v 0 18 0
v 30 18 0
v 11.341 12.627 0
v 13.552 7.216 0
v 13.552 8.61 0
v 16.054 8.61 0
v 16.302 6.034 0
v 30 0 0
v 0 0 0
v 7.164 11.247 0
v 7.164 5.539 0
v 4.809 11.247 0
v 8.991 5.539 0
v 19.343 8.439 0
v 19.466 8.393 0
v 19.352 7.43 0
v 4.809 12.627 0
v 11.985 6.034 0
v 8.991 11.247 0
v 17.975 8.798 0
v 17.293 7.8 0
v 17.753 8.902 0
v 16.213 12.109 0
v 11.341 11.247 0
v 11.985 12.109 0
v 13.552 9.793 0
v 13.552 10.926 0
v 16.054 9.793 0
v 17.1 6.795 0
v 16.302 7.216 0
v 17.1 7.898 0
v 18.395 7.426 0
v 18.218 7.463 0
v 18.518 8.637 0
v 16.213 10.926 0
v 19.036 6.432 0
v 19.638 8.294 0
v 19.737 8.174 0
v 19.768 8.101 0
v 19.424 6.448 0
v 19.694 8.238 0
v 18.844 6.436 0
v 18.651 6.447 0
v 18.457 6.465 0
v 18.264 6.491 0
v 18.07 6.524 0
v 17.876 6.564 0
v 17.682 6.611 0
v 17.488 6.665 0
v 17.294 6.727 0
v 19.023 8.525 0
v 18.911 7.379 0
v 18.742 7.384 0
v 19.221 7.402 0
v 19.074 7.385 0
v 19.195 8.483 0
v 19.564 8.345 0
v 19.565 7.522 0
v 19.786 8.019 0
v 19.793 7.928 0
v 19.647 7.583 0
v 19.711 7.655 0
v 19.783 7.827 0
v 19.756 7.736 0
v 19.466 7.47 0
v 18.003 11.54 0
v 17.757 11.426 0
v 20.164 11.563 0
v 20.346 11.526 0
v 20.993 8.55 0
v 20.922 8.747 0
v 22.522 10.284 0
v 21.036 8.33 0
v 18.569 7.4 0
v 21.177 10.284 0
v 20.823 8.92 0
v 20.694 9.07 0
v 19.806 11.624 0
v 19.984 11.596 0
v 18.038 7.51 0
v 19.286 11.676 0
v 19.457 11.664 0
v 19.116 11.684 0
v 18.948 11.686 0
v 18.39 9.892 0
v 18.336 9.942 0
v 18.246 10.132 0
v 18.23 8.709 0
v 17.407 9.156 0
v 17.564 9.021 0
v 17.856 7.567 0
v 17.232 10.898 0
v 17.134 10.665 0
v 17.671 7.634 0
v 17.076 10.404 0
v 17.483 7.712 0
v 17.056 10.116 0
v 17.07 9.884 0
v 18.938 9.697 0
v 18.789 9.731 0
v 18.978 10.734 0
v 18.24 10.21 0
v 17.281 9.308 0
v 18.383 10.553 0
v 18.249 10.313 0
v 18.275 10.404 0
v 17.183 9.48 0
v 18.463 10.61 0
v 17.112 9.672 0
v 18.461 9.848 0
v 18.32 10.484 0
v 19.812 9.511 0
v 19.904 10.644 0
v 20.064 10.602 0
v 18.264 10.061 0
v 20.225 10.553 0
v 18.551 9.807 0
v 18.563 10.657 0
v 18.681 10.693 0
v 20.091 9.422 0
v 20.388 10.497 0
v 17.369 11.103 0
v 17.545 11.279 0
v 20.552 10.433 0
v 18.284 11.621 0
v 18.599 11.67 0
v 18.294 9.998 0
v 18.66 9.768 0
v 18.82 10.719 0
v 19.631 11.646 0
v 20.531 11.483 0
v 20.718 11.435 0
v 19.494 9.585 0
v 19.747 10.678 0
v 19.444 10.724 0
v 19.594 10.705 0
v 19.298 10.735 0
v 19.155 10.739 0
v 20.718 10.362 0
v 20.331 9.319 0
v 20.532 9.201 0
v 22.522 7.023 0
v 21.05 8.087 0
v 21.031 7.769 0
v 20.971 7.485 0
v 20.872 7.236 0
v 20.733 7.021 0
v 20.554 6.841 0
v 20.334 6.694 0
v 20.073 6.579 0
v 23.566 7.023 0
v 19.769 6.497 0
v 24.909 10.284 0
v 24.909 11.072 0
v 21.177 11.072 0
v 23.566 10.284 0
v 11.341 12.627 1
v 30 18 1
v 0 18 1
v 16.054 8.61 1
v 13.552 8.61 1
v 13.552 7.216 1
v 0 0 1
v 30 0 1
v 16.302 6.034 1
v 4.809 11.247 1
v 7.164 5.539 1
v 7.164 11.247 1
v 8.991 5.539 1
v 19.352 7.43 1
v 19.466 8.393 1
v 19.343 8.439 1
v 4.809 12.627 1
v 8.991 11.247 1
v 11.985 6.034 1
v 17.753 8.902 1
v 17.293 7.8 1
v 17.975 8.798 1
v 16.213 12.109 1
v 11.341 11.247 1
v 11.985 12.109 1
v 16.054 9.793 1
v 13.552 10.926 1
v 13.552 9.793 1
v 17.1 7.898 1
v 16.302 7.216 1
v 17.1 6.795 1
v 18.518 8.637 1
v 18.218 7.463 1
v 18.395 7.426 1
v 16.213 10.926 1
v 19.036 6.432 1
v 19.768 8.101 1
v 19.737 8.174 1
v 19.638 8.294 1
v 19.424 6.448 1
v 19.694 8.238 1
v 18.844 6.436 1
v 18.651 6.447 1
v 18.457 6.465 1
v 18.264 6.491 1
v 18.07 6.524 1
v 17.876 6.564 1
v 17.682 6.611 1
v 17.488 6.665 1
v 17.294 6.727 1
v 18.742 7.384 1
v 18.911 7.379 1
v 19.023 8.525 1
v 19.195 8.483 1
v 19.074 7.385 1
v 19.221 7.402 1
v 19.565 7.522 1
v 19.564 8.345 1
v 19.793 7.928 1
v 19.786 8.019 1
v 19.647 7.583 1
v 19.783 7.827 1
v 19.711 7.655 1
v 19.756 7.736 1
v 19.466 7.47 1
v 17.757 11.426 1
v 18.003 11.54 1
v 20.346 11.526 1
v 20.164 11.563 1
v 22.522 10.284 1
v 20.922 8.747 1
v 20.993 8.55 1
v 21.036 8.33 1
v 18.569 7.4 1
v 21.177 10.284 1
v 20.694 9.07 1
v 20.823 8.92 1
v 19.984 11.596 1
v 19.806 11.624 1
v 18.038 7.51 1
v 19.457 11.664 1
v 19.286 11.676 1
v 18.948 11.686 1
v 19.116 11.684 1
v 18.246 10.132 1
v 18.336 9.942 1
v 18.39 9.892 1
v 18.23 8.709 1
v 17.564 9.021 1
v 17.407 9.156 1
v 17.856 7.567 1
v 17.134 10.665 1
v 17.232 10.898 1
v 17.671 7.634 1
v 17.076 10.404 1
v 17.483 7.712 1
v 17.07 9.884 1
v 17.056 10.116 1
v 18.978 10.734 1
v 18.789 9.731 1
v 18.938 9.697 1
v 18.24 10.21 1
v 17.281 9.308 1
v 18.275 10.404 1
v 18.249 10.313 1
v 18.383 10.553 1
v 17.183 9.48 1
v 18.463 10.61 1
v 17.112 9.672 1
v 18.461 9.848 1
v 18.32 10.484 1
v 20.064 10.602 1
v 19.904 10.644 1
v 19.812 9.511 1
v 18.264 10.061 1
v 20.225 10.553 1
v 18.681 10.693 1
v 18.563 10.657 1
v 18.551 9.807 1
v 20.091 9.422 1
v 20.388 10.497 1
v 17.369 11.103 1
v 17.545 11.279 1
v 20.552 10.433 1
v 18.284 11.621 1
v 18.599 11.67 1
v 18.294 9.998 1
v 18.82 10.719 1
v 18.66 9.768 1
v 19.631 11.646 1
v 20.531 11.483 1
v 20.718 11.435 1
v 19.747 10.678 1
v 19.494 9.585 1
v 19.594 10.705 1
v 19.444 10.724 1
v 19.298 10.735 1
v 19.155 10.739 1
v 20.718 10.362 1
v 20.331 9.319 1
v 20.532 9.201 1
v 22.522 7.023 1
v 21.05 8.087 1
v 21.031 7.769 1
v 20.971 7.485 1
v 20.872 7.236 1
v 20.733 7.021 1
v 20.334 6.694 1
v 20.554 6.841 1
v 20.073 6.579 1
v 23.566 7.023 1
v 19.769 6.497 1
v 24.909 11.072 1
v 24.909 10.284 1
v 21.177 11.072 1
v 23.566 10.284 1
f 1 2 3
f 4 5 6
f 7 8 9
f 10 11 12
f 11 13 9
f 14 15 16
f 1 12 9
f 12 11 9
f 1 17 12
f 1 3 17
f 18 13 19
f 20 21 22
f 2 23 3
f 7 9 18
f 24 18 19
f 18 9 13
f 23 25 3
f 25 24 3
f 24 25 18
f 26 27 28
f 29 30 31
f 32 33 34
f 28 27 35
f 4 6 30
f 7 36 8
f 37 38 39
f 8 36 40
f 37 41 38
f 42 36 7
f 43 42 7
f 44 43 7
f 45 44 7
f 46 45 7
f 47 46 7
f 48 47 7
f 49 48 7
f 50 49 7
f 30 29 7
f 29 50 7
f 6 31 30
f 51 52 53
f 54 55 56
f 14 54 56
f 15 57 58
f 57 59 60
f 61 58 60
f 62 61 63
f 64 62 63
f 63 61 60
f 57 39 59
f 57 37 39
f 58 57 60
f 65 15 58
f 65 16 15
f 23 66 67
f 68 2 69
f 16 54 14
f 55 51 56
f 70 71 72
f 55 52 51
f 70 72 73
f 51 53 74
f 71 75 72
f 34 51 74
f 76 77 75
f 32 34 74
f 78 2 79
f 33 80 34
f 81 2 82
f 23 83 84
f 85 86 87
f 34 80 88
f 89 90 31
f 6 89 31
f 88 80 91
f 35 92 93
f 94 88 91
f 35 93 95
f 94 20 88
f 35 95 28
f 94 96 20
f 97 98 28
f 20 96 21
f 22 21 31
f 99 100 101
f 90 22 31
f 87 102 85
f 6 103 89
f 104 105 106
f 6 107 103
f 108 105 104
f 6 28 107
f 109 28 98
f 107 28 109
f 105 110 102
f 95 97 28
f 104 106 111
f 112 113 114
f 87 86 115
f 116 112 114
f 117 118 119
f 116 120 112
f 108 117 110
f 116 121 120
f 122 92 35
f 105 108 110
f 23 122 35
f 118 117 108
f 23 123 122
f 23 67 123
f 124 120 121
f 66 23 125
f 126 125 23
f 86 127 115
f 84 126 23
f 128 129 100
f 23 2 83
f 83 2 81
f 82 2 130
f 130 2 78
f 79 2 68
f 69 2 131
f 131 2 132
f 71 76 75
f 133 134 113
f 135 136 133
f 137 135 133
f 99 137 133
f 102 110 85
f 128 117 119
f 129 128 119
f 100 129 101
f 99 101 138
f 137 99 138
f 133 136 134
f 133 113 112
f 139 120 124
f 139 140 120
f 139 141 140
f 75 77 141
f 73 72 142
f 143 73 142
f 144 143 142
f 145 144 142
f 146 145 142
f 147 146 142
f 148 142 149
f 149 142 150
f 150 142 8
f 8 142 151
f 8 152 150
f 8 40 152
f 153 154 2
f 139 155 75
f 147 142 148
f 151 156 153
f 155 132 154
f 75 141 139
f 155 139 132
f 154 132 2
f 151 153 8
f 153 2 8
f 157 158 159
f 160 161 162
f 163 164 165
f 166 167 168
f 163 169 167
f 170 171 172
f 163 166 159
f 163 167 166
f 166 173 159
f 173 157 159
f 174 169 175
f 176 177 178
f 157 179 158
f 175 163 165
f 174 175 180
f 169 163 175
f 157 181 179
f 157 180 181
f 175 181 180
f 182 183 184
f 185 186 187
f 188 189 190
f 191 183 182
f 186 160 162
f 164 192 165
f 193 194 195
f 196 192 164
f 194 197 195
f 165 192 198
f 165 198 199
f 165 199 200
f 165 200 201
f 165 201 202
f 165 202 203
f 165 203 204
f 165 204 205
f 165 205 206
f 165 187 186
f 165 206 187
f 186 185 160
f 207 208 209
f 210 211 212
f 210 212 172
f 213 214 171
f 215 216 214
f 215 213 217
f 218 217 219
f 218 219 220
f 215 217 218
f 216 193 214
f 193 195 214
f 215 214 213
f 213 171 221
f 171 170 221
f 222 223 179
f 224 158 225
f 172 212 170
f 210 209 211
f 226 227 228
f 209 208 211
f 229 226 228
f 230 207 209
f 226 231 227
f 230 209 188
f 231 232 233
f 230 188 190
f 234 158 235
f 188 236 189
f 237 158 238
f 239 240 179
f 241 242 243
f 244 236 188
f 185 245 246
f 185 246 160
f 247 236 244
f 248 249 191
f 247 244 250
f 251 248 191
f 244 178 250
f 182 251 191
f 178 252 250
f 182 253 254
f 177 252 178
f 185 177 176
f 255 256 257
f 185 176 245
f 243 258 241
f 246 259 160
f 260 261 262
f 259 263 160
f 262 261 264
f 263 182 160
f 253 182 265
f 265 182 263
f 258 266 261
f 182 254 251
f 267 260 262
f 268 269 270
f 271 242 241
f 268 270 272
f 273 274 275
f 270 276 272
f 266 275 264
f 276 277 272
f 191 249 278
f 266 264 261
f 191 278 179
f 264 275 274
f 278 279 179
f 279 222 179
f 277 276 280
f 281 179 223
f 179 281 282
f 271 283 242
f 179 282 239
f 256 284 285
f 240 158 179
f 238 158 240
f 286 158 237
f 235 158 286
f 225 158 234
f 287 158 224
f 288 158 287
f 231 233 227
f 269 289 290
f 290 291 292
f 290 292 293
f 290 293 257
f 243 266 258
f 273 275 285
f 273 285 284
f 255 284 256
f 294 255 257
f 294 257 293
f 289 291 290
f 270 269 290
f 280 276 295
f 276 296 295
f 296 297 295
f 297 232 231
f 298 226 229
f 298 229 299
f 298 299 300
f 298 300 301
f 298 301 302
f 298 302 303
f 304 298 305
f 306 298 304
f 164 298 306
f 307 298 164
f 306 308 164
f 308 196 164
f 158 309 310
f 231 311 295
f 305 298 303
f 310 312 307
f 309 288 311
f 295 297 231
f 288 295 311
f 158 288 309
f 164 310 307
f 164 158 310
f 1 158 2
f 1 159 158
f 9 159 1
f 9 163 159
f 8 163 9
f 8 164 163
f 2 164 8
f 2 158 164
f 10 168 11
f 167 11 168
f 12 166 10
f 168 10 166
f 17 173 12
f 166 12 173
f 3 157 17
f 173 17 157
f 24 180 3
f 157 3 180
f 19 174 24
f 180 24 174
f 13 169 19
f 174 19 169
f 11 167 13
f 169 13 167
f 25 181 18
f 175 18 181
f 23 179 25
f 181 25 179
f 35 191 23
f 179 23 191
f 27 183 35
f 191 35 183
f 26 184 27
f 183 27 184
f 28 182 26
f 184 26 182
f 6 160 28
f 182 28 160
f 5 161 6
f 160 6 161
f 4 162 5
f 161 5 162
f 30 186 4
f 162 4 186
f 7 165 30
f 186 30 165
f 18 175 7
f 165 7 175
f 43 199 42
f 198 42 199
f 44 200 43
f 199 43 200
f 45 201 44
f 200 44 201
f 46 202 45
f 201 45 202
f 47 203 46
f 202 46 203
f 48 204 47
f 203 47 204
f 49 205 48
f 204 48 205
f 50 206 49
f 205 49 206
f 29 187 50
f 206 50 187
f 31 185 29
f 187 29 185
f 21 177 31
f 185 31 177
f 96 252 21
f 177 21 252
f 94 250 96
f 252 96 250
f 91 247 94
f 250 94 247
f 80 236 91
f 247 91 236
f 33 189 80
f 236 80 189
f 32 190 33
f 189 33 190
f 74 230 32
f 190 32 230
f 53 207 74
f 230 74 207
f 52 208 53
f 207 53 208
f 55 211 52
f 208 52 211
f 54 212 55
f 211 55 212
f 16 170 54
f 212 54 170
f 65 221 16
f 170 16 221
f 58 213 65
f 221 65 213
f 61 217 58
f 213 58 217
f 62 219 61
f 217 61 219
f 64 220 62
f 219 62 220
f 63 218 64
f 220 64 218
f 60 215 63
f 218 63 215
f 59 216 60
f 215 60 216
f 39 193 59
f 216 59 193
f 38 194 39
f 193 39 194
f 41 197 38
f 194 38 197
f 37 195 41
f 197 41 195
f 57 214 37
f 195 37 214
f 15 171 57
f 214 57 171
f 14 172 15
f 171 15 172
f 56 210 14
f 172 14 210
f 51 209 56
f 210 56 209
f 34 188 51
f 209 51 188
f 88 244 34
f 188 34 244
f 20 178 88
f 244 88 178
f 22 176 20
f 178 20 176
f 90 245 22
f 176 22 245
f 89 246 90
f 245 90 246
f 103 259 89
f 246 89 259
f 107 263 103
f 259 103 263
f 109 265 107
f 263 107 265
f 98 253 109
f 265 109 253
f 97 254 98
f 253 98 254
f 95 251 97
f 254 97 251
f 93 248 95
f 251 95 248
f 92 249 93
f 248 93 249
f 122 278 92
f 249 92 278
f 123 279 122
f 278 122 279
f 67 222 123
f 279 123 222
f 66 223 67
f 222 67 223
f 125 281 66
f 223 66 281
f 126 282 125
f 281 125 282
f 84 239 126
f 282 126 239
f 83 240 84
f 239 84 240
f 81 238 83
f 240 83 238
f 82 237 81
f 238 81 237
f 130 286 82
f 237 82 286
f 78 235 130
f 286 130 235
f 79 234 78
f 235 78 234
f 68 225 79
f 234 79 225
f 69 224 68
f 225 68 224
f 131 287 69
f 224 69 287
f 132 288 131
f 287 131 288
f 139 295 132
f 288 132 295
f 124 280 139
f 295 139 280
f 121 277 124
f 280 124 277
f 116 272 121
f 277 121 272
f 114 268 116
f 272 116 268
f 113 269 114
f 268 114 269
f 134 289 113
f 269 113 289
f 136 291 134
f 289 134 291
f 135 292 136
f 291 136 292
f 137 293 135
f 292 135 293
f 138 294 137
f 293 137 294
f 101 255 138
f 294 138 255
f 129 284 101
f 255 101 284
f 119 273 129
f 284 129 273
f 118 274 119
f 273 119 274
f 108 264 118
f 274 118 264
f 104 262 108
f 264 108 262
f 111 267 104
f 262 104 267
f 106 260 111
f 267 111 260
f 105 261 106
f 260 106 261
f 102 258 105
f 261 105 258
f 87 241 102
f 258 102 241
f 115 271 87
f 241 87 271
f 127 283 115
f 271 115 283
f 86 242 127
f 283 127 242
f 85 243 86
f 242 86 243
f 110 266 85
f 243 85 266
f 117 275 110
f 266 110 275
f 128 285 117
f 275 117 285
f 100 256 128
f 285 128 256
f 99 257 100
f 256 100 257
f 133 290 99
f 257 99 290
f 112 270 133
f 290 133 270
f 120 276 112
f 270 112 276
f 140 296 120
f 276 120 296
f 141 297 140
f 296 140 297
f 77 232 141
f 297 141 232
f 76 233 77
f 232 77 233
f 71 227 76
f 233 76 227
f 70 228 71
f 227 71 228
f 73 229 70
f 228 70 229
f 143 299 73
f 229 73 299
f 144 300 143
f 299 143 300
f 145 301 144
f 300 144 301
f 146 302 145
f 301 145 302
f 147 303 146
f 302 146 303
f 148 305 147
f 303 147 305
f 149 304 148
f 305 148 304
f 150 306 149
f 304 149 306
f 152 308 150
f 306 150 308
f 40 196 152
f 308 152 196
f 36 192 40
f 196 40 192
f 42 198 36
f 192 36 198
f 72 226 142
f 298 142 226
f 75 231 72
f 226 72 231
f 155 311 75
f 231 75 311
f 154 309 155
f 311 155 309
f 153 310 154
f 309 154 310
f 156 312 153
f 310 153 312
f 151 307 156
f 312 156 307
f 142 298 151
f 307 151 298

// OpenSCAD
$fa = 1;
$fs = 1.75 / 2;

module letter(letter, size) {
    text(
        text = letter,
        size = size,
        font = "Lato:style=Bold",
        halign = "center",
        valign = "center"
    );
}

linear_extrude(height = 1)
difference() {
    square([30, 18]);

    union() {
        translate([8, 9])
        letter("T", 7);
        translate([14, 9])
        letter("E", 6);
        translate([19, 9])
        letter("S", 5);
        translate([23, 9])
        letter("T", 4);
    }
}
